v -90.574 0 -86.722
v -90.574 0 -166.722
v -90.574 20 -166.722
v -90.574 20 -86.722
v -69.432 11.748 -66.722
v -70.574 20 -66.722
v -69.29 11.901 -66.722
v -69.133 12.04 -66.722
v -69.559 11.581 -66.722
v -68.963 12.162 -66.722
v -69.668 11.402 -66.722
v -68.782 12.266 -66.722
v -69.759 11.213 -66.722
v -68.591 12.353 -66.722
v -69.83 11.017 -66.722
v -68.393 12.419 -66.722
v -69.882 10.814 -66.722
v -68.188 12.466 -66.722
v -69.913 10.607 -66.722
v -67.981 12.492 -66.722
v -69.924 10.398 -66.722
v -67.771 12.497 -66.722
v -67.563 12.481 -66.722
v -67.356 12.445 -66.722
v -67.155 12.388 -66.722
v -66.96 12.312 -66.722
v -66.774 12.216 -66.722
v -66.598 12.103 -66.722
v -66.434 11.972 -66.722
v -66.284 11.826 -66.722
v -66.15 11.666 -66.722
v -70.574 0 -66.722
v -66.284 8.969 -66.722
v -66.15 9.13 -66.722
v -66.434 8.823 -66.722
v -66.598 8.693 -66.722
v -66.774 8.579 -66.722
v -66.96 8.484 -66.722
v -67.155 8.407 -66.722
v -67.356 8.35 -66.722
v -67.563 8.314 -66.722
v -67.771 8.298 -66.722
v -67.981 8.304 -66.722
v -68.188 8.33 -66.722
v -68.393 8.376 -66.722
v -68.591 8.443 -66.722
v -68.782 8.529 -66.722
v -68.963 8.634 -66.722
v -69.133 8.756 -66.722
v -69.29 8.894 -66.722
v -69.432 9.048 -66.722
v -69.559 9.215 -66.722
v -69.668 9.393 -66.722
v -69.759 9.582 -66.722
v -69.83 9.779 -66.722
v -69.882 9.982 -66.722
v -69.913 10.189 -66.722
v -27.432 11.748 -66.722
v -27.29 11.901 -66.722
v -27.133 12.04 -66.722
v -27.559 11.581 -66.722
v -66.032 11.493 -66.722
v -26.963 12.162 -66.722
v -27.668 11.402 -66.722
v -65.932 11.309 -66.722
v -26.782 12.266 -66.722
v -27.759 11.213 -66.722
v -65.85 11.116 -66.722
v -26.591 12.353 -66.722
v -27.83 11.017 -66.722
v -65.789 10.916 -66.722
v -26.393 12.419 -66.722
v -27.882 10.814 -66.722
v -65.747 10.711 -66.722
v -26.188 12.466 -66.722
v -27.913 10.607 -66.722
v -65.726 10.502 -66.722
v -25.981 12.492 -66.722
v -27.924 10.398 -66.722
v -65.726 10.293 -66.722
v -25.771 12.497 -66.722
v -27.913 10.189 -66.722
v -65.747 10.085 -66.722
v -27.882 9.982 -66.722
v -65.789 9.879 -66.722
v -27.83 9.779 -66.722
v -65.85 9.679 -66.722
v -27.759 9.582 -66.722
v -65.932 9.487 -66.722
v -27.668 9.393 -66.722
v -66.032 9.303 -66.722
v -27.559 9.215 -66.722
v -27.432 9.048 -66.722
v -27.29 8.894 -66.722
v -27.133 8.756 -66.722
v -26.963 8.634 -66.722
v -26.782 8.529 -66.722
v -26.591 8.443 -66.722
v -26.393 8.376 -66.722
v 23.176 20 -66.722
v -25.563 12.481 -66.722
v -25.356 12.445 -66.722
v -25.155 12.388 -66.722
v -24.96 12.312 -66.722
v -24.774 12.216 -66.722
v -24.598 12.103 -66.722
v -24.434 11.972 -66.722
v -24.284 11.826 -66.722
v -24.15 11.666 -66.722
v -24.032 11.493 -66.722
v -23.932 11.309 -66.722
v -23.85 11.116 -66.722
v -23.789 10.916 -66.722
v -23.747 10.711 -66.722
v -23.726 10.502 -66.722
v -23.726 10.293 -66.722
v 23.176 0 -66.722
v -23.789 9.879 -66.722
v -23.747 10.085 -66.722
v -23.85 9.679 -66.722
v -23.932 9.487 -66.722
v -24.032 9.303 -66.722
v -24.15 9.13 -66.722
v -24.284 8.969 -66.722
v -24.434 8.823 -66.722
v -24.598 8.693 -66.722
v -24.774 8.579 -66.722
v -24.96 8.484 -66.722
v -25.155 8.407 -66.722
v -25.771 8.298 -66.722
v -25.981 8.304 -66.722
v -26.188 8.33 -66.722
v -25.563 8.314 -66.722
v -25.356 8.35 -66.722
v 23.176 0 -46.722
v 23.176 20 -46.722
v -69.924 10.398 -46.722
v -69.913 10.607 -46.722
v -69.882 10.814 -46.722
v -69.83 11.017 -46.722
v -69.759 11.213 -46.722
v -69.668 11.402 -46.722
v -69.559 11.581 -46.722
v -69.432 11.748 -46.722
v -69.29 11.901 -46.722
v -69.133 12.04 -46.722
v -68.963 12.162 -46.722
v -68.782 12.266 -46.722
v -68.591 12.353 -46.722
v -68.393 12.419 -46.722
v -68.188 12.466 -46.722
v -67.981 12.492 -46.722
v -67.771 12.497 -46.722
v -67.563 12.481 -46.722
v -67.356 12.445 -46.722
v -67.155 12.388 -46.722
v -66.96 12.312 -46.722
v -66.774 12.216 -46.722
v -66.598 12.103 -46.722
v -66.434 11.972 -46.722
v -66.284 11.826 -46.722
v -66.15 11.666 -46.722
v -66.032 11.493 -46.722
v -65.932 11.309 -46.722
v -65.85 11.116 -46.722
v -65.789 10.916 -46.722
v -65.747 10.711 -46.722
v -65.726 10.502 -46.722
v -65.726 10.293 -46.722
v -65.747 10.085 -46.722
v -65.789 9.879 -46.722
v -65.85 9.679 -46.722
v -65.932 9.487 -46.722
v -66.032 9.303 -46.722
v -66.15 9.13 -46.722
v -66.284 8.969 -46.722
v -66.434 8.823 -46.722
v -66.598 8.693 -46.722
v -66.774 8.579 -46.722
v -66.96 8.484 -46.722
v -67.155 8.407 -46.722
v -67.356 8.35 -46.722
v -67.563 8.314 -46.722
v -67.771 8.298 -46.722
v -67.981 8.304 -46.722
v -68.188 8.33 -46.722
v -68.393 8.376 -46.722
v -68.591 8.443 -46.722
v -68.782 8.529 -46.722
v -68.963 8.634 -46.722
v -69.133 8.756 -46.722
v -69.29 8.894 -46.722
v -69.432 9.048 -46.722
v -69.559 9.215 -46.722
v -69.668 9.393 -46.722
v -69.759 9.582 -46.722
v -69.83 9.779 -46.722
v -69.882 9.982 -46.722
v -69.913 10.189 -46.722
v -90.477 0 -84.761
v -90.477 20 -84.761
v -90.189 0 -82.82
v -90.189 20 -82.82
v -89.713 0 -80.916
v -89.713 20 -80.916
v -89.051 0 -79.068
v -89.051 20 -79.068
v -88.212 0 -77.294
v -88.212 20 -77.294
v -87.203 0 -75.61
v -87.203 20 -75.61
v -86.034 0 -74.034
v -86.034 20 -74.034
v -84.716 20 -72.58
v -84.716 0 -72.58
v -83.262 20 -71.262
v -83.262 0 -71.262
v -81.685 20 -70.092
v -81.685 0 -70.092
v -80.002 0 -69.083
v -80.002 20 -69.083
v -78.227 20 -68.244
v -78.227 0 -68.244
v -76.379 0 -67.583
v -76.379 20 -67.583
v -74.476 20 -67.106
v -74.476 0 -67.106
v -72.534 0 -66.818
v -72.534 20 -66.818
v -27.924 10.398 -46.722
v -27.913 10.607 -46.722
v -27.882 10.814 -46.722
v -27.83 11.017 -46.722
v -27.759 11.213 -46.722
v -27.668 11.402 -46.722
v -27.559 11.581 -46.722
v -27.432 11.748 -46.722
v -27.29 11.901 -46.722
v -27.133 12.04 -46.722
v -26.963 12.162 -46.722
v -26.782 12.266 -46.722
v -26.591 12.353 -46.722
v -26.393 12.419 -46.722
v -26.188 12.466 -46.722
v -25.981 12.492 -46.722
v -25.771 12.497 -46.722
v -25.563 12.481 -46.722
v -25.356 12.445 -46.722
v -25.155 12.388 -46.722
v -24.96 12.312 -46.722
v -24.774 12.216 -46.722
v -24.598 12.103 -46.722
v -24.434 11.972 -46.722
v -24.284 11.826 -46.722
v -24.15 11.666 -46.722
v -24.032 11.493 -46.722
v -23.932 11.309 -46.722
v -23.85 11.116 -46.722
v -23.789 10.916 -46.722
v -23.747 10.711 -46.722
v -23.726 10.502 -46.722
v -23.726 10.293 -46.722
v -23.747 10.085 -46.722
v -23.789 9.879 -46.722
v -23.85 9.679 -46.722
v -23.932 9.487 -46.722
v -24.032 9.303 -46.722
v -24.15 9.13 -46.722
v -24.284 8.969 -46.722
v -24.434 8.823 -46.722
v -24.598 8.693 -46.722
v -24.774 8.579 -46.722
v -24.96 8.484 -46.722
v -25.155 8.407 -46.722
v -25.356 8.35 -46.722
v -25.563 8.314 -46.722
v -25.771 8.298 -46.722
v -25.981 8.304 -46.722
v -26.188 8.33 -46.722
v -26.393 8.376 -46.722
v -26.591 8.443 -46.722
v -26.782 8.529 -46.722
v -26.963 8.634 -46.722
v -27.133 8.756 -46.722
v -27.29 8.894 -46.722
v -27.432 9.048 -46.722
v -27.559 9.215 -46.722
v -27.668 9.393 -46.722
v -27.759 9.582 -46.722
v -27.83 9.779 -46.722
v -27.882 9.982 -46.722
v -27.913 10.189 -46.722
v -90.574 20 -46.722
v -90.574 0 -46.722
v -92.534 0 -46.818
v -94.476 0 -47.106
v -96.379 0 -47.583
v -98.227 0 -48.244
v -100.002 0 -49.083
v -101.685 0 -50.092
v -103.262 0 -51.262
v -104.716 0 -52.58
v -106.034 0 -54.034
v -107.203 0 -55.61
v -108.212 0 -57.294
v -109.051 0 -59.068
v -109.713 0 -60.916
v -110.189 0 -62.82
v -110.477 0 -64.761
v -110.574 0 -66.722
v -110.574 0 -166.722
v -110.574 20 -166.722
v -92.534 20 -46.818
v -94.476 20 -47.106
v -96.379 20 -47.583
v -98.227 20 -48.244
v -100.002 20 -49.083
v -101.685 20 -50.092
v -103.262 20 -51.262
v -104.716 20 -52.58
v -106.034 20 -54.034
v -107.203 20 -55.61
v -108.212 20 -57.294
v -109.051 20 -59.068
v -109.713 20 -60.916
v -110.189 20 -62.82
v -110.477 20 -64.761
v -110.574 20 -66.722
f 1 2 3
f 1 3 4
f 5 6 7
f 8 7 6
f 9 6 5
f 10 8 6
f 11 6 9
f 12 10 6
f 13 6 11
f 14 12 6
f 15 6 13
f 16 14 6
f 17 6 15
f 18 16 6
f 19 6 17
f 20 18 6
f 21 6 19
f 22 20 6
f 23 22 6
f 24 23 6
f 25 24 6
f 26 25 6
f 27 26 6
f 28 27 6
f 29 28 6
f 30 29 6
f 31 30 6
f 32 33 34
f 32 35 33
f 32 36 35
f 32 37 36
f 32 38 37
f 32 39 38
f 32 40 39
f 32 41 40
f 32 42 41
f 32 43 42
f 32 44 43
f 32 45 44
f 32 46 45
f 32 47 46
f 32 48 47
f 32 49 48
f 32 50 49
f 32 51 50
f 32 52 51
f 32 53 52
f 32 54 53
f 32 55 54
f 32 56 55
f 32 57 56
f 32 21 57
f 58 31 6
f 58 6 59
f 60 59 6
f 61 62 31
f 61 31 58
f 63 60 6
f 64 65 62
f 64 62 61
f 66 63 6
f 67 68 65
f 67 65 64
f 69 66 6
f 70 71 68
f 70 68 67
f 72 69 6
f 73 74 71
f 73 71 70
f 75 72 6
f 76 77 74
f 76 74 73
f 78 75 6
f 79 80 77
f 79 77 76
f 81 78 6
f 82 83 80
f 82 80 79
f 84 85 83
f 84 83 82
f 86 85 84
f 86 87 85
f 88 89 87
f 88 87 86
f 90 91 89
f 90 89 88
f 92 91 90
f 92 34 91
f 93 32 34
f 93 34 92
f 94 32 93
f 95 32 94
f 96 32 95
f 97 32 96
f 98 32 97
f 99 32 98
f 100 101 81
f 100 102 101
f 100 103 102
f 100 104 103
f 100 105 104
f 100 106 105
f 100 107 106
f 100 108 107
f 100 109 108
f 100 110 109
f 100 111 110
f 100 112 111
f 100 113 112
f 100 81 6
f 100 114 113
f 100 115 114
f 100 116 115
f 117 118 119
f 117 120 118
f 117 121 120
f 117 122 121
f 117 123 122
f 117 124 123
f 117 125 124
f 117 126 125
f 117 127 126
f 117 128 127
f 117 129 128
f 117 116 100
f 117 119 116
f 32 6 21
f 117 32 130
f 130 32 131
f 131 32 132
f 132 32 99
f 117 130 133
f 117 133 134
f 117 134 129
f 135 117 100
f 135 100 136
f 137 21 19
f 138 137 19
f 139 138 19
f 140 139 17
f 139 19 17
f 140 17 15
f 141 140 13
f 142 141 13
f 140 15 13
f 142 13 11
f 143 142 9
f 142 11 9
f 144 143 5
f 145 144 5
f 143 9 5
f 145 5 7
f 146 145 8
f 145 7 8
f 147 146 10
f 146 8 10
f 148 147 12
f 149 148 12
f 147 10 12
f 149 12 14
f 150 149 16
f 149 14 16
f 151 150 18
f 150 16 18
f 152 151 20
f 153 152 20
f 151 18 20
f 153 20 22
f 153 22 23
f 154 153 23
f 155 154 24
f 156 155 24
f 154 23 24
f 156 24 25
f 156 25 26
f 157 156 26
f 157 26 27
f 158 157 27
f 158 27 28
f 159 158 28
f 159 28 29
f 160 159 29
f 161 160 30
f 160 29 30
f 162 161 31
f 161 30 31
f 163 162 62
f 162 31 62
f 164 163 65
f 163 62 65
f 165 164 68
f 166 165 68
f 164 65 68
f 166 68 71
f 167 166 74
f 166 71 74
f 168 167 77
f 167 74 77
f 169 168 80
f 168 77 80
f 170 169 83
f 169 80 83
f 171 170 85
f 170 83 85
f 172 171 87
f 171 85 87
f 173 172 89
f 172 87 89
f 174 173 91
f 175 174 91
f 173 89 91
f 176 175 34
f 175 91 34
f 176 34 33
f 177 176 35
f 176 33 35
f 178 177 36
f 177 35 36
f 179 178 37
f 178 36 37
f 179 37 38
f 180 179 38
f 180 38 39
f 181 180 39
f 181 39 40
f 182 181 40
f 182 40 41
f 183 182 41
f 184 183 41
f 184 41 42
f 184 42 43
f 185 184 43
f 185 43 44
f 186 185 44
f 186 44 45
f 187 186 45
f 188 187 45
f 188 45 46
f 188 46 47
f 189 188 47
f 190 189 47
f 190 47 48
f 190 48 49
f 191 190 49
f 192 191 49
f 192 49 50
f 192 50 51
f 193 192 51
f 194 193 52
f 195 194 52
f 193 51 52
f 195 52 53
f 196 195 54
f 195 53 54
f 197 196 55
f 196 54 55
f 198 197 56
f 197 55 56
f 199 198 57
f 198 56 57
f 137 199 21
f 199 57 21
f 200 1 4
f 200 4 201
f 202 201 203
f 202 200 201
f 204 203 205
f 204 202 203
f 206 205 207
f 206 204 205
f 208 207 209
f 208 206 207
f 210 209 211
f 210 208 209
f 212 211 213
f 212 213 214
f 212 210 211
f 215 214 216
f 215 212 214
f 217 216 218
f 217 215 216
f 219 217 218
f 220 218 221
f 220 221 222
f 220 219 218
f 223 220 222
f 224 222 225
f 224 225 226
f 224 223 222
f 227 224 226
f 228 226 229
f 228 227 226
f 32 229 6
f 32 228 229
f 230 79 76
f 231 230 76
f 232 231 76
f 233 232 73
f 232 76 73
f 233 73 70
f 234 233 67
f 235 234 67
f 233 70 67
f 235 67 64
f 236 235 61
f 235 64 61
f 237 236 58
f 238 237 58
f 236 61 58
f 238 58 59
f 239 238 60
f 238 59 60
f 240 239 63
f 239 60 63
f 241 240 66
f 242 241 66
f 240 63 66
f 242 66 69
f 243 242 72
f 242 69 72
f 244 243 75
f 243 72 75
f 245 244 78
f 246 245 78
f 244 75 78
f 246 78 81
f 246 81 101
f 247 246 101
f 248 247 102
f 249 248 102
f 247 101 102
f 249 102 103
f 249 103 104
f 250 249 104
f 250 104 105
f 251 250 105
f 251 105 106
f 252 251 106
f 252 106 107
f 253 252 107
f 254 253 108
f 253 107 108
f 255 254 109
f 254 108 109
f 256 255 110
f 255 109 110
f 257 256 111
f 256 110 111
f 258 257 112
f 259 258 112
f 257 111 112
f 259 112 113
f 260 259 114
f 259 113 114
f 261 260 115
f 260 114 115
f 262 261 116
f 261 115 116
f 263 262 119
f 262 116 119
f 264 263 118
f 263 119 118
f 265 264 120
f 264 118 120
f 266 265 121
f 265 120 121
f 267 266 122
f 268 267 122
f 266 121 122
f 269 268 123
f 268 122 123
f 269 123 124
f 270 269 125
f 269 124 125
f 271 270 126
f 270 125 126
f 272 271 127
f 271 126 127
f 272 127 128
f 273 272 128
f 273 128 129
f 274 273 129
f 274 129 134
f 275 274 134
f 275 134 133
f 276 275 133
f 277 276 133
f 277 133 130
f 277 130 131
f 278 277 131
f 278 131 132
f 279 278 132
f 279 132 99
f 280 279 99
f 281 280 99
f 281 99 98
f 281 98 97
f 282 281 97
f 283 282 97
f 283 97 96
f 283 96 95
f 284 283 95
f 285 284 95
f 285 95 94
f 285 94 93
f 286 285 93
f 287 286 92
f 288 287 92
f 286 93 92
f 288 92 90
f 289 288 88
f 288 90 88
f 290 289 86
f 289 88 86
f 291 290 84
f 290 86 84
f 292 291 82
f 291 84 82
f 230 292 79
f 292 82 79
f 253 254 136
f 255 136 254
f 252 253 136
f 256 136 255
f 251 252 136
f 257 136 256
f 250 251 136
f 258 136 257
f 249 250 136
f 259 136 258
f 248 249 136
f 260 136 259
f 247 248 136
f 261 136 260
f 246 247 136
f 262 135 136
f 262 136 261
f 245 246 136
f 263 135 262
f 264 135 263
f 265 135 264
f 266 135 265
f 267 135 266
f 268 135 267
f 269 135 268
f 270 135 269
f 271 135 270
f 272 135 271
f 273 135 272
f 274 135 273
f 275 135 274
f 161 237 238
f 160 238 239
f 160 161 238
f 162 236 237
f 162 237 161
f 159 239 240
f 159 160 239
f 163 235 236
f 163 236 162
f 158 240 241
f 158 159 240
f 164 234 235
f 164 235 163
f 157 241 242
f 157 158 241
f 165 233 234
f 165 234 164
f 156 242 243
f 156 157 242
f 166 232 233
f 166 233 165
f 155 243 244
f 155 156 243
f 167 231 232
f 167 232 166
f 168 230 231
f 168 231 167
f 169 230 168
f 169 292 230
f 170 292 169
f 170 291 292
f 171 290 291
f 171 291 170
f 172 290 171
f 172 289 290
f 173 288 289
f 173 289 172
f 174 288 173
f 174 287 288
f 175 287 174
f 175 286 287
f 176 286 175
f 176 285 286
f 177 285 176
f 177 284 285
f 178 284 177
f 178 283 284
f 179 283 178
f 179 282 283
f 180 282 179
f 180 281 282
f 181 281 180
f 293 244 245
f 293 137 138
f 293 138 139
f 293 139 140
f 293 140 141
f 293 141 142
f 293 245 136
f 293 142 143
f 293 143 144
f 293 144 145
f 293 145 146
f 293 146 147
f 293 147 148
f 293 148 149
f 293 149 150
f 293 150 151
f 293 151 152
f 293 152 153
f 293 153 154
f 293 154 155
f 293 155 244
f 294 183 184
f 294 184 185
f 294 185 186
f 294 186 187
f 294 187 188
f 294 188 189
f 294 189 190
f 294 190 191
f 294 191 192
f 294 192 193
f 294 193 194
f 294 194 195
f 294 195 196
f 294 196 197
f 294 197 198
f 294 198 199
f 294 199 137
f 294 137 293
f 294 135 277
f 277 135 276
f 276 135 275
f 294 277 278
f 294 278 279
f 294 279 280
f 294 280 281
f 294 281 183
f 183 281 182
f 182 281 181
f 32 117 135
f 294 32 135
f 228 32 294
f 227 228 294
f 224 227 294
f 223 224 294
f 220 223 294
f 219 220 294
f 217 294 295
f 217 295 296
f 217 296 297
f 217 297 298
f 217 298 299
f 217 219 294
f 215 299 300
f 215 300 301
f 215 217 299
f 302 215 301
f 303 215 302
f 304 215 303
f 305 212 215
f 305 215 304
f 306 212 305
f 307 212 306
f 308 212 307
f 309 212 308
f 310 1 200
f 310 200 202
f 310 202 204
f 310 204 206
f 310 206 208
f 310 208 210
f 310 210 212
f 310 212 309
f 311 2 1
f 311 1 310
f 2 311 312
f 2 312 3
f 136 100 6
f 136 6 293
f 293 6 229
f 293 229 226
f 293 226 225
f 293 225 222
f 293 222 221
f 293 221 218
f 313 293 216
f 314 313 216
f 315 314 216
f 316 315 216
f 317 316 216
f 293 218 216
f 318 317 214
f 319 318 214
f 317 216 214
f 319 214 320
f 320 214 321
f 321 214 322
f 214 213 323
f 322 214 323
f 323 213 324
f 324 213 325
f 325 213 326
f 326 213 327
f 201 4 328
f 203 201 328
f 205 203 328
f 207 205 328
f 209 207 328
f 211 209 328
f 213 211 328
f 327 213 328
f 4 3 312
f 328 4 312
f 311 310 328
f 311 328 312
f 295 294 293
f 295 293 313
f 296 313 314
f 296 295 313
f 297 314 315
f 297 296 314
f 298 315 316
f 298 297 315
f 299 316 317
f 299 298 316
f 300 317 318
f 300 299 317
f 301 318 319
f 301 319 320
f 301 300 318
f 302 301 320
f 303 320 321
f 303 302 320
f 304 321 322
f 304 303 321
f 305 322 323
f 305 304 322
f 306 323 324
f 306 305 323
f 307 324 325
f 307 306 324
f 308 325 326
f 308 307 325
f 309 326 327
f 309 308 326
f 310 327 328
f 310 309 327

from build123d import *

# Parameters (mm, degrees)
BOSS_EXTRUDE1_DEPTH = 20
SKETCH2_R           = 2.1
CUT_EXTRUDE3_DEPTH  = 20


with BuildPart() as part:
    # Sketch1 → Boss-Extrude1 (new body)
    with BuildSketch(Plane(origin=(0, 0, 0), x_dir=(1, 0, 0), z_dir=(0, 1, 0))):
        with BuildLine():
            Line((23.176256614, 46.721781305), (-90.573743386, 46.721781305))
            ThreePointArc((-90.573743386, 46.721781305), (-104.71587901, 52.579645681), (-110.573743386, 66.721781305))
            Line((-110.573743386, 66.721781305), (-110.573743386, 166.721781305))
            Line((-110.573743386, 166.721781305), (-90.573743386, 166.721781305))
            Line((-90.573743386, 166.721781305), (-90.573743386, 86.721781305))
            ThreePointArc((-90.573743386, 86.721781305), (-84.71587901, 72.579645681), (-70.573743386, 66.721781305))
            Line((-70.573743386, 66.721781305), (23.176256614, 66.721781305))
            Line((23.176256614, 66.721781305), (23.176256614, 46.721781305))
        make_face()
    extrude(amount=BOSS_EXTRUDE1_DEPTH)

    # Sketch2 → Cut-Extrude3 (cut)
    with BuildSketch(Plane(origin=(0, 0, -66.721781305), x_dir=(-1, 0, 0), z_dir=(0, 0, -1))):
        with Locations((25.823743386, 10.397679773)):
            Circle(SKETCH2_R)
        with Locations((67.823743386, 10.397679773)):
            Circle(SKETCH2_R)
    extrude(amount=-CUT_EXTRUDE3_DEPTH, mode=Mode.SUBTRACT)


solid = part.part
